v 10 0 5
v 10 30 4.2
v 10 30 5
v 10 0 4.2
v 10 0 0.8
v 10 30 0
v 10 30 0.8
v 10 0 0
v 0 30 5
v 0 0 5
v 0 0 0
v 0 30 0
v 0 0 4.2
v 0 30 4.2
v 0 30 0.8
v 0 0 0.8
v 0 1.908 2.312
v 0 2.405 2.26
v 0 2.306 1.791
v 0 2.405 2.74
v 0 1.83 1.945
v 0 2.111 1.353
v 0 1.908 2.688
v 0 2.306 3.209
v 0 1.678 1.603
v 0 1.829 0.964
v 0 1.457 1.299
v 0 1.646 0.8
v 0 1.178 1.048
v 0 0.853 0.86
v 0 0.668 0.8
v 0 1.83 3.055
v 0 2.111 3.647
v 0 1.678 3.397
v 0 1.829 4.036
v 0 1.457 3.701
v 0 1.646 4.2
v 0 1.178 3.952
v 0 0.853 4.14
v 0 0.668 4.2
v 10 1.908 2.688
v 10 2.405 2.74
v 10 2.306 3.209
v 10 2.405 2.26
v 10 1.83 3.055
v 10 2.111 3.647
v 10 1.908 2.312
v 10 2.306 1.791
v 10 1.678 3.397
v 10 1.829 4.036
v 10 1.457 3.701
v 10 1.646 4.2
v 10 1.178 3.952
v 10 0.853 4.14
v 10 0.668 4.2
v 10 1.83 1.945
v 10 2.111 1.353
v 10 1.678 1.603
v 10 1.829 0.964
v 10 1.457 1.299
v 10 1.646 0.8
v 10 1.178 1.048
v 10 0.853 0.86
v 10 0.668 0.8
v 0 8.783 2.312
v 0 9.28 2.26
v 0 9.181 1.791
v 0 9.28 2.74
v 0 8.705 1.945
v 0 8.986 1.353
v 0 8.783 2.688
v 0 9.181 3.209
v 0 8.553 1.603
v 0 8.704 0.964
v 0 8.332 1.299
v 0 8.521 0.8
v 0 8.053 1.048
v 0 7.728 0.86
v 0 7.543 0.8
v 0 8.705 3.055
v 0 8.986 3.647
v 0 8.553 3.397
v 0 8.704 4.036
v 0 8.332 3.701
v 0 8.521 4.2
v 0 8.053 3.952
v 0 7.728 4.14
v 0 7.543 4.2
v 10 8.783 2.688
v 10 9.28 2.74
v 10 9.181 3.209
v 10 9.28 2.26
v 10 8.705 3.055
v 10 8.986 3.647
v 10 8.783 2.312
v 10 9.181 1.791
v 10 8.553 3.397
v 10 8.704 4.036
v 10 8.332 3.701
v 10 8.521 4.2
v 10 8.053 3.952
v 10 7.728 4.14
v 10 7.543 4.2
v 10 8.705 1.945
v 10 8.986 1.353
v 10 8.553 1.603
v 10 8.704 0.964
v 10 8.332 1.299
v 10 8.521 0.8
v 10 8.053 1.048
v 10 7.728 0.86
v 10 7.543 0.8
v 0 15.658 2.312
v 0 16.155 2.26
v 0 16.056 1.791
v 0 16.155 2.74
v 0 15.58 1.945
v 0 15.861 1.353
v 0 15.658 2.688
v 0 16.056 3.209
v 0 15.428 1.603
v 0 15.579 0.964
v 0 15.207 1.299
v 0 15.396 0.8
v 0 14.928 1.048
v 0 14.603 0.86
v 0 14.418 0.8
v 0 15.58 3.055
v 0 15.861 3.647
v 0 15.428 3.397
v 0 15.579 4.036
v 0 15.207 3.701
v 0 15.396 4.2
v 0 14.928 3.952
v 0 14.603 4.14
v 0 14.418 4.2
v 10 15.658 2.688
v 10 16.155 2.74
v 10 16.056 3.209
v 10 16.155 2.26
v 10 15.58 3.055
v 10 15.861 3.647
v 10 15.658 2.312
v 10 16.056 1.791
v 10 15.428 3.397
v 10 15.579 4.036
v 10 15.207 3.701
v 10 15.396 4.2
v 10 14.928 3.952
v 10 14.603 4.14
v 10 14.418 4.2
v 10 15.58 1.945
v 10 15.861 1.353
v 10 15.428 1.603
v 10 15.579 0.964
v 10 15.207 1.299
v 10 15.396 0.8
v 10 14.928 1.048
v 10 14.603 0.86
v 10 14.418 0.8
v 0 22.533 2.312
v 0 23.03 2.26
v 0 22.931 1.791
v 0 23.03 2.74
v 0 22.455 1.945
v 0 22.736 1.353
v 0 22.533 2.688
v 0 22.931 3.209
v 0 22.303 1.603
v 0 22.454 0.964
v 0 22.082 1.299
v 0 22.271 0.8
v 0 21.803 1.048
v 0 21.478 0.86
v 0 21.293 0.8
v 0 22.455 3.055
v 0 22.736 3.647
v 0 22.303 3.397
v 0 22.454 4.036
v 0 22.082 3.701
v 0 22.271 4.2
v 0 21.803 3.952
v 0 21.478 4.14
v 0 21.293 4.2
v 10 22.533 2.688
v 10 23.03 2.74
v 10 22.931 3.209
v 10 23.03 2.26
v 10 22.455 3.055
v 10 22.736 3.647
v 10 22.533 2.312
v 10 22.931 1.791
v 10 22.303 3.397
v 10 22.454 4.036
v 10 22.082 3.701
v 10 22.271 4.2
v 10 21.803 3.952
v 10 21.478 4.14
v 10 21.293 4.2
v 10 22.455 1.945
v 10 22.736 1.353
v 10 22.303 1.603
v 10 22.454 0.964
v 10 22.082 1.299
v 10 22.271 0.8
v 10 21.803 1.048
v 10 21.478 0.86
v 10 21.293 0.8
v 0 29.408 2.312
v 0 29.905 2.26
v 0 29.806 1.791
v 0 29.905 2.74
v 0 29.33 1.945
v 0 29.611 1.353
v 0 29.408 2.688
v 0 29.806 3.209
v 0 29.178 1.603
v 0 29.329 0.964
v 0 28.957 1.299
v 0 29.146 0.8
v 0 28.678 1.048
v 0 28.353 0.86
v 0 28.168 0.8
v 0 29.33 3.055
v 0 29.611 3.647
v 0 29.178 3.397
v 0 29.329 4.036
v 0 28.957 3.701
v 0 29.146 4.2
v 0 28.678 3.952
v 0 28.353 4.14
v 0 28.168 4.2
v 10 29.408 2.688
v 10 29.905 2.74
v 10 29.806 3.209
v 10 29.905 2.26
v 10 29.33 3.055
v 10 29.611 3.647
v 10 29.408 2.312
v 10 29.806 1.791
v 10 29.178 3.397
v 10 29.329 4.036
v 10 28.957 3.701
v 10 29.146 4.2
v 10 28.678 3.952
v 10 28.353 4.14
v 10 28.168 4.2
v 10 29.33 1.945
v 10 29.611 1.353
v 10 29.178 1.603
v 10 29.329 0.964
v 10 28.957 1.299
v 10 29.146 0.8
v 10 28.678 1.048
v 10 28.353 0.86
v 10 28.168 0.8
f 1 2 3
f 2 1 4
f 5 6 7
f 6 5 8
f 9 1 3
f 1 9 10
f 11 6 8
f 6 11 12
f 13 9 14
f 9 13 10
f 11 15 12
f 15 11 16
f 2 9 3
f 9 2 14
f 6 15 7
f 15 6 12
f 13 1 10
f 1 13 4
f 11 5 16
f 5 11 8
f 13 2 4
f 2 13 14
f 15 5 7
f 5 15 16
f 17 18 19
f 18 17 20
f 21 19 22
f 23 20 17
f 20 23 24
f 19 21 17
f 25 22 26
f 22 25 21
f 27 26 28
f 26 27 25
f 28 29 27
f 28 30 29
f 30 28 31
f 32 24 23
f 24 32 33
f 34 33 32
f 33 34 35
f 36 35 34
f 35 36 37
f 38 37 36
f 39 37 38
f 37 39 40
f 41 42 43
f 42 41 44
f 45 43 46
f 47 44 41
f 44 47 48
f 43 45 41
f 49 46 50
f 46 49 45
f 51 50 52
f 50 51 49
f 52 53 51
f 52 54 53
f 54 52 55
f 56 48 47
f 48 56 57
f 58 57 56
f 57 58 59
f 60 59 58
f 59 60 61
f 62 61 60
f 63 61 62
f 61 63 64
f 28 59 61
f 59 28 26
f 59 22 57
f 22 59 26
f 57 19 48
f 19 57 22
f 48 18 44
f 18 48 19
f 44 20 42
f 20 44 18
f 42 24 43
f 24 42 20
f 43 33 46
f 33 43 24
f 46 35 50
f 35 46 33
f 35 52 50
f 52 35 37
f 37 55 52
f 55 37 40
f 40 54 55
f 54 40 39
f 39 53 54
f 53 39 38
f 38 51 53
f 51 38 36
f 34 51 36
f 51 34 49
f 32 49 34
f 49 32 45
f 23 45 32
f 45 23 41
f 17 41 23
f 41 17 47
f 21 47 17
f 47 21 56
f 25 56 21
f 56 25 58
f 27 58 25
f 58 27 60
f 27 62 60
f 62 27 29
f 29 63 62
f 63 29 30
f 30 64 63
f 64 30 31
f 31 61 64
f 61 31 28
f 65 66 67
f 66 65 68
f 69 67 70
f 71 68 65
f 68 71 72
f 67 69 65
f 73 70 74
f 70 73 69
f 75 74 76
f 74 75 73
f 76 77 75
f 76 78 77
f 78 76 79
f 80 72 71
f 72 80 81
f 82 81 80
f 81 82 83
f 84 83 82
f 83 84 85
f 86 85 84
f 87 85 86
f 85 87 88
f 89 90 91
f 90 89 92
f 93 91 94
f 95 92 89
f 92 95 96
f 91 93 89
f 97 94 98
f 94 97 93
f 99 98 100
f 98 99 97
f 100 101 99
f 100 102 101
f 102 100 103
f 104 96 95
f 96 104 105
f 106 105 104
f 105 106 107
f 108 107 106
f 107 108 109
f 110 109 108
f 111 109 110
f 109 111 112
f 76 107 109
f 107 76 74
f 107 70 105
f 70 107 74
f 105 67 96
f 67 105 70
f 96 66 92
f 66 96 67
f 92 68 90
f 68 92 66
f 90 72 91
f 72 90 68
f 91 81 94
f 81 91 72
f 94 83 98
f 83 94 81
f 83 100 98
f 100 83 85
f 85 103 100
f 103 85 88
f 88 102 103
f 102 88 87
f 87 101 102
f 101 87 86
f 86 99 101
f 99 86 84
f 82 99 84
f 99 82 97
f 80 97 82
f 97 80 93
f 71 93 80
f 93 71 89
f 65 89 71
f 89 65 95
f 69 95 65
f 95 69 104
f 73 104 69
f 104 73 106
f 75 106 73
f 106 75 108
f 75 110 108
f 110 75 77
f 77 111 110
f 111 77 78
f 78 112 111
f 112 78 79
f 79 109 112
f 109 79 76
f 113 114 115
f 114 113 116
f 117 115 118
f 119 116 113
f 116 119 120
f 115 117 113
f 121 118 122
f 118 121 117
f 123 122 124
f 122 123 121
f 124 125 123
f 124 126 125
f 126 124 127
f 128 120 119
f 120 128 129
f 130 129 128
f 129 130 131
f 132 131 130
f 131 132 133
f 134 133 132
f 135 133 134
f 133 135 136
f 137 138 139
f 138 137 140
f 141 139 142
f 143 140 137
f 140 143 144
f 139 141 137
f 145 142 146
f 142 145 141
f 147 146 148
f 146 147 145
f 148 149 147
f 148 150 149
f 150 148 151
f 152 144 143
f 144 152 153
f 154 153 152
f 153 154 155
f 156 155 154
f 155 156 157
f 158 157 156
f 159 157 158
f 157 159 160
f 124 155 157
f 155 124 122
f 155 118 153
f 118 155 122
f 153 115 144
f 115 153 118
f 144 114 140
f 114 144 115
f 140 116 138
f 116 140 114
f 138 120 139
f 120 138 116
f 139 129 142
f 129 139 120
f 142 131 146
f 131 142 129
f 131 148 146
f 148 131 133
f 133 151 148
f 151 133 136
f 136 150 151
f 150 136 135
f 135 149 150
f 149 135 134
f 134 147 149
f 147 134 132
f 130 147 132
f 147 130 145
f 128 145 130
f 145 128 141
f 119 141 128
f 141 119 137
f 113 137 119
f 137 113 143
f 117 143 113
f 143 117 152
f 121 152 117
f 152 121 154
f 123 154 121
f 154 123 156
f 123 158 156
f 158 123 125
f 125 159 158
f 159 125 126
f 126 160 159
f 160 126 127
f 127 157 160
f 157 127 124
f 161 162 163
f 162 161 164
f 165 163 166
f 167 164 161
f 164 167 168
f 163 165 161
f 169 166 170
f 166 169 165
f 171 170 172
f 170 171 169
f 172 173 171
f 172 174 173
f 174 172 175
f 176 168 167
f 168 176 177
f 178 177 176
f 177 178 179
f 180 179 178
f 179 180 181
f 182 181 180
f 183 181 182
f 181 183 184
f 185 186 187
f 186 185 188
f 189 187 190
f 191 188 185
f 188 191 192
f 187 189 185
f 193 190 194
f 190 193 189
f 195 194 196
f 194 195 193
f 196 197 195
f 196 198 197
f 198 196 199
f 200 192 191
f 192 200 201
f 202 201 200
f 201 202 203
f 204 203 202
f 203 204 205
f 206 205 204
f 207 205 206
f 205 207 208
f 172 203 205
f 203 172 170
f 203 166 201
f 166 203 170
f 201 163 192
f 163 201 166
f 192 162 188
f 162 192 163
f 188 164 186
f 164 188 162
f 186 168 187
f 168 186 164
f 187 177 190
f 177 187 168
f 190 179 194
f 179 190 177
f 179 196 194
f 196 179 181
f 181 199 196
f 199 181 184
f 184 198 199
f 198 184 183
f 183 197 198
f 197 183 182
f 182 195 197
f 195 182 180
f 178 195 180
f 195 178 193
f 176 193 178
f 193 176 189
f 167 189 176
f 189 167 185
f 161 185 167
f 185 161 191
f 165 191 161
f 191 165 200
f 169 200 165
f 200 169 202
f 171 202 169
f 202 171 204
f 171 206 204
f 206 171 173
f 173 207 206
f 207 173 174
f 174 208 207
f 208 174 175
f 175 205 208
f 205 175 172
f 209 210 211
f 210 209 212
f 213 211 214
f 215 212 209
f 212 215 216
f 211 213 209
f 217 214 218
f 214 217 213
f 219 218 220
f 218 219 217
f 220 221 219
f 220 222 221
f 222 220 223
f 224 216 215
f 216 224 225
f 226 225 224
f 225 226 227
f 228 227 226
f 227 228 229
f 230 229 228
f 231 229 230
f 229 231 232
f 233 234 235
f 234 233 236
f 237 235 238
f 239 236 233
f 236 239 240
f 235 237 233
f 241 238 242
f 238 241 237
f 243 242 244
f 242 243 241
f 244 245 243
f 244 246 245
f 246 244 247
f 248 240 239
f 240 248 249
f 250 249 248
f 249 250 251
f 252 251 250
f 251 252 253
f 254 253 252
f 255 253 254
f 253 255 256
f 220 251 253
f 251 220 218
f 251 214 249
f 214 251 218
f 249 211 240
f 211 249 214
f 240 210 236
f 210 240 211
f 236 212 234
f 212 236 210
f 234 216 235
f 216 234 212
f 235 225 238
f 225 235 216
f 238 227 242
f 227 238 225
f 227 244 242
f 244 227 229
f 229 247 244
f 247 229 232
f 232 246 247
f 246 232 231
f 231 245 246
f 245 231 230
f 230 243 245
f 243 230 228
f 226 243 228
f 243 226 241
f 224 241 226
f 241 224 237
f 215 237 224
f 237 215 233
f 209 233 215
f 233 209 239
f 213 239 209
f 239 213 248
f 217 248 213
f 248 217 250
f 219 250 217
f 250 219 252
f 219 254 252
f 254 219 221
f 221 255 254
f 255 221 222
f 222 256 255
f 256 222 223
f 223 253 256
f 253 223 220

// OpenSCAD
plate_thickness = 0.8;
wall_thickness = 0.5;
wall_space = 7;

module rib(span, length) {
  $fn = 30;
  d = span*1.35;
  
  linear_extrude(length) {
    translate([0, -d*0.3]) {
      intersection() {
        difference() {
          circle(d=d);
          circle(d=d-wall_thickness*2);
        }
        translate([0, d])
          square([span, d*2], center=true);
      } 
    }
  }
}

module pad(dim) {
  // Top and bottom plates.
  difference() {
    cube(dim);
    translate([-1, -1, plate_thickness])
      cube(dim + [2, 2, -plate_thickness*2]);
  }
  
  tuck = 1;
  cells = round((dim.y - wall_thickness - 2*tuck) / (wall_thickness + wall_space));
  offs = (dim.y - wall_thickness - 2*tuck) / cells;
  space = offs - wall_thickness;
  rib_span = dim.z - plate_thickness*2;

  translate([0, tuck+wall_thickness, plate_thickness+rib_span/2])
    for (i = [0:cells])
      translate([0, i*offs, 0])
        rotate([0, 90 , 0])
          rib(rib_span, dim.x);
}

dim = [10, 30, 5];
pad(dim);
